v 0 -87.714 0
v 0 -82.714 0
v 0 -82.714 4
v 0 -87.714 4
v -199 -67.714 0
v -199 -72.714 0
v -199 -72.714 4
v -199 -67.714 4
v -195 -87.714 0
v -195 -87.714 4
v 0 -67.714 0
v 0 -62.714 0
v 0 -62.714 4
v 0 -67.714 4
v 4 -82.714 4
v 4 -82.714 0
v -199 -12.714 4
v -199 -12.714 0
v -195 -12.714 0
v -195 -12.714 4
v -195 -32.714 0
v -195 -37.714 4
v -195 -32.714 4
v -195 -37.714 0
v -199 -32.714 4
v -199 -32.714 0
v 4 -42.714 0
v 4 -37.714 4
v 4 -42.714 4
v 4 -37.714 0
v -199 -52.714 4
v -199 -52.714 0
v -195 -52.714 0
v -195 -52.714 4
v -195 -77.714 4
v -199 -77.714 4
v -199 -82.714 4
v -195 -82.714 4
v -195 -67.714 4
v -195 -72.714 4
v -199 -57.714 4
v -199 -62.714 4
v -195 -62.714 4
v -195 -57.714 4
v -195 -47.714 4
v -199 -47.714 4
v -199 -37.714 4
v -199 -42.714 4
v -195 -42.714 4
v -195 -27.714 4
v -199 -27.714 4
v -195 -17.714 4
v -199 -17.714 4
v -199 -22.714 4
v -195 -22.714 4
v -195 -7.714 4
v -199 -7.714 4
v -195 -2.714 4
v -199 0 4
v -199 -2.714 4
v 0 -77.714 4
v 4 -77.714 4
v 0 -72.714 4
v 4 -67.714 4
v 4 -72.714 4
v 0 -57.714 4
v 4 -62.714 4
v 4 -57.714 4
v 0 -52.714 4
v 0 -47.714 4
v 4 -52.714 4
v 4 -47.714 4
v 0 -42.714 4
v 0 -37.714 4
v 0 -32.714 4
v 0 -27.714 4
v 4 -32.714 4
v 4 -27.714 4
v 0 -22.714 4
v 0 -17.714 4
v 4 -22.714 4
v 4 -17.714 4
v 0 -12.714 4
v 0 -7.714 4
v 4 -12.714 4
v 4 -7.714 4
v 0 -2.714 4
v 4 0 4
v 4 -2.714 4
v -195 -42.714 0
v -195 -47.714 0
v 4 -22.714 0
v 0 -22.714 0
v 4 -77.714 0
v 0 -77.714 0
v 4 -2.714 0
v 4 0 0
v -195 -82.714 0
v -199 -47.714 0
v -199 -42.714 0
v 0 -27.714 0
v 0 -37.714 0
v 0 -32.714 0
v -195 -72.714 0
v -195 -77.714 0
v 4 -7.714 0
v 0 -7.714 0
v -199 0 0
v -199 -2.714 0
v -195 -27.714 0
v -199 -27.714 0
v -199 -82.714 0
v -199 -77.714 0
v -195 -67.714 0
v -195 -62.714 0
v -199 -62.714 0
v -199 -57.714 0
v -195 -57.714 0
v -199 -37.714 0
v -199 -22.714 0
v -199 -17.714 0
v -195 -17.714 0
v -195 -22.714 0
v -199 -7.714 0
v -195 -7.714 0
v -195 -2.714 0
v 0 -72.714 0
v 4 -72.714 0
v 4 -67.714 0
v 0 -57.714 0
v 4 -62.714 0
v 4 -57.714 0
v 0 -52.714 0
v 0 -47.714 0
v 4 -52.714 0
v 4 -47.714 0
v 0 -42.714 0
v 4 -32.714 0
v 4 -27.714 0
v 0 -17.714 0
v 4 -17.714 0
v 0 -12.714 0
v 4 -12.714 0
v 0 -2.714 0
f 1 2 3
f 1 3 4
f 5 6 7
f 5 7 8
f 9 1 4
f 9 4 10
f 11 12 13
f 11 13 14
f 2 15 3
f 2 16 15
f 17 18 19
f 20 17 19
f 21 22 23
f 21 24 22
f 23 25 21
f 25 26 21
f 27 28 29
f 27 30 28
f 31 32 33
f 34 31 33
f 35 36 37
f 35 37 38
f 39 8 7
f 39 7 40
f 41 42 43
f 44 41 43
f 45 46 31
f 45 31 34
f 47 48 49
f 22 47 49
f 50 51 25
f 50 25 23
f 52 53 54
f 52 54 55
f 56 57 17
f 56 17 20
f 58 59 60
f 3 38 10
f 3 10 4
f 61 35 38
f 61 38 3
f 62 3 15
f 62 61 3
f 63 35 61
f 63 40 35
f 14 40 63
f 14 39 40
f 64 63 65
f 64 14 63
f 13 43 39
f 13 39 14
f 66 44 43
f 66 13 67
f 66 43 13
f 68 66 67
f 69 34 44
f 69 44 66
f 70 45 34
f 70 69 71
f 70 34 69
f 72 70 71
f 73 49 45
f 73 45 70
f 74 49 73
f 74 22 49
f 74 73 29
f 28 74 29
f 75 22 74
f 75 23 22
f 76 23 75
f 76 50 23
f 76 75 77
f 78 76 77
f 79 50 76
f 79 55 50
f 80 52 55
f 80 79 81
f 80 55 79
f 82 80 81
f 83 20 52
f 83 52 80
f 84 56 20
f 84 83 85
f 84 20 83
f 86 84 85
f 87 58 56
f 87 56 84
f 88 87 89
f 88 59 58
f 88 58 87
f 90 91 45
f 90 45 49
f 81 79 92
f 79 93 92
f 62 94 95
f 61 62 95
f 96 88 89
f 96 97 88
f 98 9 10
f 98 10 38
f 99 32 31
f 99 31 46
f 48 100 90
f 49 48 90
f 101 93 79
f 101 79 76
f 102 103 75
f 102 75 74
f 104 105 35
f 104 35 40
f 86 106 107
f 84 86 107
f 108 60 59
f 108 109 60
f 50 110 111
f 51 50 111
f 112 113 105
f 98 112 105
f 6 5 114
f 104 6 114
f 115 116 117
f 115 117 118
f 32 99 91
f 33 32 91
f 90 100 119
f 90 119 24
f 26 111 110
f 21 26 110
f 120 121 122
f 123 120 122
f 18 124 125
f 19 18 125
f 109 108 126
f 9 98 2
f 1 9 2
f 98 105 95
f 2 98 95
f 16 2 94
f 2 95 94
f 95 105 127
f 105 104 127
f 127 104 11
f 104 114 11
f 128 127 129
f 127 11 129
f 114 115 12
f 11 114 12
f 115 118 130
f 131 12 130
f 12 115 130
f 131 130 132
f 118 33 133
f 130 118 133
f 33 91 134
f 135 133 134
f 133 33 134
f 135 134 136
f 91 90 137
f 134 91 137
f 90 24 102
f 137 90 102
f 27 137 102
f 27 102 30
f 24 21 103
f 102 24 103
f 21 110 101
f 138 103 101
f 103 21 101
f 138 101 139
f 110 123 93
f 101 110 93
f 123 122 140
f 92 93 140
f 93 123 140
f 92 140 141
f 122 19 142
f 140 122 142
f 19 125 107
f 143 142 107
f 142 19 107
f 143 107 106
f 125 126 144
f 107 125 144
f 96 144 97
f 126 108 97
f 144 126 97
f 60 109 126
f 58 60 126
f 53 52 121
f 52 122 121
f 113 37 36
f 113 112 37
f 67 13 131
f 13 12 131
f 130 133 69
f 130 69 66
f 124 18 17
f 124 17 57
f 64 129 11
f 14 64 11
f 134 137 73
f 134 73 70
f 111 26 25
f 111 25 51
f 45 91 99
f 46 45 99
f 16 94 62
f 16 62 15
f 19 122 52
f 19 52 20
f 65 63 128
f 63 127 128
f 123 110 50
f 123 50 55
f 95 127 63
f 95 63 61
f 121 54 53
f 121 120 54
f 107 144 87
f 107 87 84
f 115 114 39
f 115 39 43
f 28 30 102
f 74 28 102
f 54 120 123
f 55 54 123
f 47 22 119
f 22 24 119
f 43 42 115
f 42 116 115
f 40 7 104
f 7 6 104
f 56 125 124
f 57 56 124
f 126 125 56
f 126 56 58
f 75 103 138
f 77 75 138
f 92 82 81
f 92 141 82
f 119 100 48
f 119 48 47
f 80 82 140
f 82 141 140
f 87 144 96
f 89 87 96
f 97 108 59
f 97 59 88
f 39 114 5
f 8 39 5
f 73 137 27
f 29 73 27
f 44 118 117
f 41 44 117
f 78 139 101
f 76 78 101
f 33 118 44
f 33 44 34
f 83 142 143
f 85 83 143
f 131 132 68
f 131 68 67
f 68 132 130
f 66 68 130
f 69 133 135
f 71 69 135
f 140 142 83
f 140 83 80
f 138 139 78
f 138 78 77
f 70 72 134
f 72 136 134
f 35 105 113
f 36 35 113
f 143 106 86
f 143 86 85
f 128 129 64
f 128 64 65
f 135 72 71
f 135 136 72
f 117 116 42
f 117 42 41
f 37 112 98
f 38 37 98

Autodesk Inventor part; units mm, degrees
ref_plane "YZ Plane" through (0, 0, 0) normal (1, 0, 0) x (0, 1, 0)
ref_plane "XZ Plane" through (0, 0, 0) normal (0, 1, 0) x (-1, 0, 0)
ref_plane "XY Plane" through (0, 0, 0) normal (0, 0, 1) x (1, 0, 0)
sketch "Эскиз1" plane through (0, 0, 0) normal (0, 0, 1) x (1, 0, 0)
  line L0 (0, -87.7141) -> (4, -87.7141) projected
  line L1 (4, -87.7141) -> (4, -82.7141) projected
  line L2 (4, -82.7141) -> (0, -82.7141) projected
  line L3 (0, -82.7141) -> (0, -87.7141) projected
  line L4 (4, -77.7141) -> (0, -77.7141) projected
  line L5 (0, -82.7141) -> (0, -77.7141) projected
  line L6 (0, -82.7141) -> (4, -82.7141) projected
  line L7 (4, -77.7141) -> (4, -82.7141) projected
  line L8 (4, -67.7141) -> (0, -67.7141) projected
  line L9 (0, -72.7141) -> (0, -67.7141) projected
  line L10 (0, -72.7141) -> (4, -72.7141) projected
  line L11 (4, -67.7141) -> (4, -72.7141) projected
  line L12 (4, -57.7141) -> (0, -57.7141) projected
  line L13 (0, -62.7141) -> (0, -57.7141) projected
  line L14 (0, -62.7141) -> (4, -62.7141) projected
  line L15 (4, -57.7141) -> (4, -62.7141) projected
  line L16 (4, -47.7141) -> (0, -47.7141) projected
  line L17 (0, -52.7141) -> (0, -47.7141) projected
  line L18 (0, -52.7141) -> (4, -52.7141) projected
  line L19 (4, -47.7141) -> (4, -52.7141) projected
  line L20 (4, -37.7141) -> (0, -37.7141) projected
  line L21 (0, -42.7141) -> (0, -37.7141) projected
  line L22 (0, -42.7141) -> (4, -42.7141) projected
  line L23 (4, -37.7141) -> (4, -42.7141) projected
  line L24 (4, -27.7141) -> (0, -27.7141) projected
  line L25 (0, -32.7141) -> (0, -27.7141) projected
  line L26 (0, -32.7141) -> (4, -32.7141) projected
  line L27 (4, -27.7141) -> (4, -32.7141) projected
  line L28 (4, -17.7141) -> (0, -17.7141) projected
  line L29 (0, -22.7141) -> (0, -17.7141) projected
  line L30 (0, -22.7141) -> (4, -22.7141) projected
  line L31 (4, -17.7141) -> (4, -22.7141) projected
  line L32 (4, -7.7141) -> (0, -7.7141) projected
  line L33 (0, -12.7141) -> (0, -7.7141) projected
  line L34 (0, -12.7141) -> (4, -12.7141) projected
  line L35 (4, -7.7141) -> (4, -12.7141) projected
  line L36 (0, -2.7141) -> (4, -2.7141) projected
  line L37 (4, 0) -> (4, -2.7141) projected
  line L38 (0, 0) -> (4, 0) projected
  line L39 (0, -2.7141) -> (0, 0) projected
  line L40 (-199, -2.7141) -> (-195, -2.7141) projected
  line L41 (-195, 0) -> (-195, -2.7141) projected
  line L42 (-199, 0) -> (-195, 0) projected
  line L43 (-199, -2.7141) -> (-199, 0) projected
  line L44 (-195, -7.7141) -> (-199, -7.7141) projected
  line L45 (-199, -12.7141) -> (-199, -7.7141) projected
  line L46 (-199, -12.7141) -> (-195, -12.7141) projected
  line L47 (-195, -7.7141) -> (-195, -12.7141) projected
  line L48 (-195, -17.7141) -> (-199, -17.7141) projected
  line L49 (-199, -22.7141) -> (-199, -17.7141) projected
  line L50 (-199, -22.7141) -> (-195, -22.7141) projected
  line L51 (-195, -17.7141) -> (-195, -22.7141) projected
  line L52 (-195, -27.7141) -> (-199, -27.7141) projected
  line L53 (-199, -32.7141) -> (-199, -27.7141) projected
  line L54 (-199, -32.7141) -> (-195, -32.7141) projected
  line L55 (-195, -27.7141) -> (-195, -32.7141) projected
  line L56 (-195, -77.7141) -> (-199, -77.7141) projected
  line L57 (-199, -82.7141) -> (-199, -77.7141) projected
  line L58 (-199, -82.7141) -> (-195, -82.7141) projected
  line L59 (-195, -77.7141) -> (-195, -82.7141) projected
  line L60 (-195, -67.7141) -> (-199, -67.7141) projected
  line L61 (-199, -72.7141) -> (-199, -67.7141) projected
  line L62 (-199, -72.7141) -> (-195, -72.7141) projected
  line L63 (-195, -67.7141) -> (-195, -72.7141) projected
  line L64 (-195, -57.7141) -> (-199, -57.7141) projected
  line L65 (-199, -62.7141) -> (-199, -57.7141) projected
  line L66 (-199, -62.7141) -> (-195, -62.7141) projected
  line L67 (-195, -57.7141) -> (-195, -62.7141) projected
  line L68 (-199, -52.7141) -> (-199, -47.7141) projected
  line L69 (-195, -47.7141) -> (-199, -47.7141) projected
  line L70 (-199, -52.7141) -> (-199, -47.7141) projected
  line L71 (-199, -52.7141) -> (-195, -52.7141) projected
  line L72 (-195, -47.7141) -> (-195, -52.7141) projected
  line L73 (-195, -37.7141) -> (-199, -37.7141) projected
  line L74 (-199, -42.7141) -> (-199, -37.7141) projected
  line L75 (-199, -42.7141) -> (-195, -42.7141) projected
  line L76 (-195, -37.7141) -> (-195, -42.7141) projected
  line L77 (-195, -82.7141) -> (-199, -82.7141) projected
  line L78 (-199, -82.7141) -> (-199, -87.7141) projected
  line L79 (-199, -87.7141) -> (-195, -87.7141) projected
  line L80 (-195, -87.7141) -> (-195, -82.7141) projected
  line L81 (-195, 0) -> (0, 0)
  line L82 (0, 0) -> (0, -87.7141)
  line L83 (0, -87.7141) -> (-195, -87.7141)
  line L84 (-195, -87.7141) -> (-195, 0)
extrude "Выдавливание1" add sketch "Эскиз1" along normal blind 4 contours L83 L80 L59 L84 L63 L67 L72 L76 L55 L51 L47 L41 L81 L39 L82 L33 L29 L25 L21 L17 L13 L9 L5 L3 | L5 L4 L7 L2 | L58 L57 L56 L59 | L9 L8 L11 L10 | L62 L61 L60 L63 | L13 L12 L15 L14 | L66 L65 L64 L67 | L17 L16 L19 L18 | L71 L68 L69 L72 | L21 L20 L23 L22 | L75 L74 L73 L76 | L25 L24 L27 L26 | L54 L53 L52 L55 | L29 L28 L31 L30 | L50 L49 L48 L51 | L33 L32 L35 L34 | L46 L45 L44 L47 | L39 L38 L37 L36 | L40 L43 L42 L41
properties part number "KB33-046-004-017 - Крышка наклонная"
